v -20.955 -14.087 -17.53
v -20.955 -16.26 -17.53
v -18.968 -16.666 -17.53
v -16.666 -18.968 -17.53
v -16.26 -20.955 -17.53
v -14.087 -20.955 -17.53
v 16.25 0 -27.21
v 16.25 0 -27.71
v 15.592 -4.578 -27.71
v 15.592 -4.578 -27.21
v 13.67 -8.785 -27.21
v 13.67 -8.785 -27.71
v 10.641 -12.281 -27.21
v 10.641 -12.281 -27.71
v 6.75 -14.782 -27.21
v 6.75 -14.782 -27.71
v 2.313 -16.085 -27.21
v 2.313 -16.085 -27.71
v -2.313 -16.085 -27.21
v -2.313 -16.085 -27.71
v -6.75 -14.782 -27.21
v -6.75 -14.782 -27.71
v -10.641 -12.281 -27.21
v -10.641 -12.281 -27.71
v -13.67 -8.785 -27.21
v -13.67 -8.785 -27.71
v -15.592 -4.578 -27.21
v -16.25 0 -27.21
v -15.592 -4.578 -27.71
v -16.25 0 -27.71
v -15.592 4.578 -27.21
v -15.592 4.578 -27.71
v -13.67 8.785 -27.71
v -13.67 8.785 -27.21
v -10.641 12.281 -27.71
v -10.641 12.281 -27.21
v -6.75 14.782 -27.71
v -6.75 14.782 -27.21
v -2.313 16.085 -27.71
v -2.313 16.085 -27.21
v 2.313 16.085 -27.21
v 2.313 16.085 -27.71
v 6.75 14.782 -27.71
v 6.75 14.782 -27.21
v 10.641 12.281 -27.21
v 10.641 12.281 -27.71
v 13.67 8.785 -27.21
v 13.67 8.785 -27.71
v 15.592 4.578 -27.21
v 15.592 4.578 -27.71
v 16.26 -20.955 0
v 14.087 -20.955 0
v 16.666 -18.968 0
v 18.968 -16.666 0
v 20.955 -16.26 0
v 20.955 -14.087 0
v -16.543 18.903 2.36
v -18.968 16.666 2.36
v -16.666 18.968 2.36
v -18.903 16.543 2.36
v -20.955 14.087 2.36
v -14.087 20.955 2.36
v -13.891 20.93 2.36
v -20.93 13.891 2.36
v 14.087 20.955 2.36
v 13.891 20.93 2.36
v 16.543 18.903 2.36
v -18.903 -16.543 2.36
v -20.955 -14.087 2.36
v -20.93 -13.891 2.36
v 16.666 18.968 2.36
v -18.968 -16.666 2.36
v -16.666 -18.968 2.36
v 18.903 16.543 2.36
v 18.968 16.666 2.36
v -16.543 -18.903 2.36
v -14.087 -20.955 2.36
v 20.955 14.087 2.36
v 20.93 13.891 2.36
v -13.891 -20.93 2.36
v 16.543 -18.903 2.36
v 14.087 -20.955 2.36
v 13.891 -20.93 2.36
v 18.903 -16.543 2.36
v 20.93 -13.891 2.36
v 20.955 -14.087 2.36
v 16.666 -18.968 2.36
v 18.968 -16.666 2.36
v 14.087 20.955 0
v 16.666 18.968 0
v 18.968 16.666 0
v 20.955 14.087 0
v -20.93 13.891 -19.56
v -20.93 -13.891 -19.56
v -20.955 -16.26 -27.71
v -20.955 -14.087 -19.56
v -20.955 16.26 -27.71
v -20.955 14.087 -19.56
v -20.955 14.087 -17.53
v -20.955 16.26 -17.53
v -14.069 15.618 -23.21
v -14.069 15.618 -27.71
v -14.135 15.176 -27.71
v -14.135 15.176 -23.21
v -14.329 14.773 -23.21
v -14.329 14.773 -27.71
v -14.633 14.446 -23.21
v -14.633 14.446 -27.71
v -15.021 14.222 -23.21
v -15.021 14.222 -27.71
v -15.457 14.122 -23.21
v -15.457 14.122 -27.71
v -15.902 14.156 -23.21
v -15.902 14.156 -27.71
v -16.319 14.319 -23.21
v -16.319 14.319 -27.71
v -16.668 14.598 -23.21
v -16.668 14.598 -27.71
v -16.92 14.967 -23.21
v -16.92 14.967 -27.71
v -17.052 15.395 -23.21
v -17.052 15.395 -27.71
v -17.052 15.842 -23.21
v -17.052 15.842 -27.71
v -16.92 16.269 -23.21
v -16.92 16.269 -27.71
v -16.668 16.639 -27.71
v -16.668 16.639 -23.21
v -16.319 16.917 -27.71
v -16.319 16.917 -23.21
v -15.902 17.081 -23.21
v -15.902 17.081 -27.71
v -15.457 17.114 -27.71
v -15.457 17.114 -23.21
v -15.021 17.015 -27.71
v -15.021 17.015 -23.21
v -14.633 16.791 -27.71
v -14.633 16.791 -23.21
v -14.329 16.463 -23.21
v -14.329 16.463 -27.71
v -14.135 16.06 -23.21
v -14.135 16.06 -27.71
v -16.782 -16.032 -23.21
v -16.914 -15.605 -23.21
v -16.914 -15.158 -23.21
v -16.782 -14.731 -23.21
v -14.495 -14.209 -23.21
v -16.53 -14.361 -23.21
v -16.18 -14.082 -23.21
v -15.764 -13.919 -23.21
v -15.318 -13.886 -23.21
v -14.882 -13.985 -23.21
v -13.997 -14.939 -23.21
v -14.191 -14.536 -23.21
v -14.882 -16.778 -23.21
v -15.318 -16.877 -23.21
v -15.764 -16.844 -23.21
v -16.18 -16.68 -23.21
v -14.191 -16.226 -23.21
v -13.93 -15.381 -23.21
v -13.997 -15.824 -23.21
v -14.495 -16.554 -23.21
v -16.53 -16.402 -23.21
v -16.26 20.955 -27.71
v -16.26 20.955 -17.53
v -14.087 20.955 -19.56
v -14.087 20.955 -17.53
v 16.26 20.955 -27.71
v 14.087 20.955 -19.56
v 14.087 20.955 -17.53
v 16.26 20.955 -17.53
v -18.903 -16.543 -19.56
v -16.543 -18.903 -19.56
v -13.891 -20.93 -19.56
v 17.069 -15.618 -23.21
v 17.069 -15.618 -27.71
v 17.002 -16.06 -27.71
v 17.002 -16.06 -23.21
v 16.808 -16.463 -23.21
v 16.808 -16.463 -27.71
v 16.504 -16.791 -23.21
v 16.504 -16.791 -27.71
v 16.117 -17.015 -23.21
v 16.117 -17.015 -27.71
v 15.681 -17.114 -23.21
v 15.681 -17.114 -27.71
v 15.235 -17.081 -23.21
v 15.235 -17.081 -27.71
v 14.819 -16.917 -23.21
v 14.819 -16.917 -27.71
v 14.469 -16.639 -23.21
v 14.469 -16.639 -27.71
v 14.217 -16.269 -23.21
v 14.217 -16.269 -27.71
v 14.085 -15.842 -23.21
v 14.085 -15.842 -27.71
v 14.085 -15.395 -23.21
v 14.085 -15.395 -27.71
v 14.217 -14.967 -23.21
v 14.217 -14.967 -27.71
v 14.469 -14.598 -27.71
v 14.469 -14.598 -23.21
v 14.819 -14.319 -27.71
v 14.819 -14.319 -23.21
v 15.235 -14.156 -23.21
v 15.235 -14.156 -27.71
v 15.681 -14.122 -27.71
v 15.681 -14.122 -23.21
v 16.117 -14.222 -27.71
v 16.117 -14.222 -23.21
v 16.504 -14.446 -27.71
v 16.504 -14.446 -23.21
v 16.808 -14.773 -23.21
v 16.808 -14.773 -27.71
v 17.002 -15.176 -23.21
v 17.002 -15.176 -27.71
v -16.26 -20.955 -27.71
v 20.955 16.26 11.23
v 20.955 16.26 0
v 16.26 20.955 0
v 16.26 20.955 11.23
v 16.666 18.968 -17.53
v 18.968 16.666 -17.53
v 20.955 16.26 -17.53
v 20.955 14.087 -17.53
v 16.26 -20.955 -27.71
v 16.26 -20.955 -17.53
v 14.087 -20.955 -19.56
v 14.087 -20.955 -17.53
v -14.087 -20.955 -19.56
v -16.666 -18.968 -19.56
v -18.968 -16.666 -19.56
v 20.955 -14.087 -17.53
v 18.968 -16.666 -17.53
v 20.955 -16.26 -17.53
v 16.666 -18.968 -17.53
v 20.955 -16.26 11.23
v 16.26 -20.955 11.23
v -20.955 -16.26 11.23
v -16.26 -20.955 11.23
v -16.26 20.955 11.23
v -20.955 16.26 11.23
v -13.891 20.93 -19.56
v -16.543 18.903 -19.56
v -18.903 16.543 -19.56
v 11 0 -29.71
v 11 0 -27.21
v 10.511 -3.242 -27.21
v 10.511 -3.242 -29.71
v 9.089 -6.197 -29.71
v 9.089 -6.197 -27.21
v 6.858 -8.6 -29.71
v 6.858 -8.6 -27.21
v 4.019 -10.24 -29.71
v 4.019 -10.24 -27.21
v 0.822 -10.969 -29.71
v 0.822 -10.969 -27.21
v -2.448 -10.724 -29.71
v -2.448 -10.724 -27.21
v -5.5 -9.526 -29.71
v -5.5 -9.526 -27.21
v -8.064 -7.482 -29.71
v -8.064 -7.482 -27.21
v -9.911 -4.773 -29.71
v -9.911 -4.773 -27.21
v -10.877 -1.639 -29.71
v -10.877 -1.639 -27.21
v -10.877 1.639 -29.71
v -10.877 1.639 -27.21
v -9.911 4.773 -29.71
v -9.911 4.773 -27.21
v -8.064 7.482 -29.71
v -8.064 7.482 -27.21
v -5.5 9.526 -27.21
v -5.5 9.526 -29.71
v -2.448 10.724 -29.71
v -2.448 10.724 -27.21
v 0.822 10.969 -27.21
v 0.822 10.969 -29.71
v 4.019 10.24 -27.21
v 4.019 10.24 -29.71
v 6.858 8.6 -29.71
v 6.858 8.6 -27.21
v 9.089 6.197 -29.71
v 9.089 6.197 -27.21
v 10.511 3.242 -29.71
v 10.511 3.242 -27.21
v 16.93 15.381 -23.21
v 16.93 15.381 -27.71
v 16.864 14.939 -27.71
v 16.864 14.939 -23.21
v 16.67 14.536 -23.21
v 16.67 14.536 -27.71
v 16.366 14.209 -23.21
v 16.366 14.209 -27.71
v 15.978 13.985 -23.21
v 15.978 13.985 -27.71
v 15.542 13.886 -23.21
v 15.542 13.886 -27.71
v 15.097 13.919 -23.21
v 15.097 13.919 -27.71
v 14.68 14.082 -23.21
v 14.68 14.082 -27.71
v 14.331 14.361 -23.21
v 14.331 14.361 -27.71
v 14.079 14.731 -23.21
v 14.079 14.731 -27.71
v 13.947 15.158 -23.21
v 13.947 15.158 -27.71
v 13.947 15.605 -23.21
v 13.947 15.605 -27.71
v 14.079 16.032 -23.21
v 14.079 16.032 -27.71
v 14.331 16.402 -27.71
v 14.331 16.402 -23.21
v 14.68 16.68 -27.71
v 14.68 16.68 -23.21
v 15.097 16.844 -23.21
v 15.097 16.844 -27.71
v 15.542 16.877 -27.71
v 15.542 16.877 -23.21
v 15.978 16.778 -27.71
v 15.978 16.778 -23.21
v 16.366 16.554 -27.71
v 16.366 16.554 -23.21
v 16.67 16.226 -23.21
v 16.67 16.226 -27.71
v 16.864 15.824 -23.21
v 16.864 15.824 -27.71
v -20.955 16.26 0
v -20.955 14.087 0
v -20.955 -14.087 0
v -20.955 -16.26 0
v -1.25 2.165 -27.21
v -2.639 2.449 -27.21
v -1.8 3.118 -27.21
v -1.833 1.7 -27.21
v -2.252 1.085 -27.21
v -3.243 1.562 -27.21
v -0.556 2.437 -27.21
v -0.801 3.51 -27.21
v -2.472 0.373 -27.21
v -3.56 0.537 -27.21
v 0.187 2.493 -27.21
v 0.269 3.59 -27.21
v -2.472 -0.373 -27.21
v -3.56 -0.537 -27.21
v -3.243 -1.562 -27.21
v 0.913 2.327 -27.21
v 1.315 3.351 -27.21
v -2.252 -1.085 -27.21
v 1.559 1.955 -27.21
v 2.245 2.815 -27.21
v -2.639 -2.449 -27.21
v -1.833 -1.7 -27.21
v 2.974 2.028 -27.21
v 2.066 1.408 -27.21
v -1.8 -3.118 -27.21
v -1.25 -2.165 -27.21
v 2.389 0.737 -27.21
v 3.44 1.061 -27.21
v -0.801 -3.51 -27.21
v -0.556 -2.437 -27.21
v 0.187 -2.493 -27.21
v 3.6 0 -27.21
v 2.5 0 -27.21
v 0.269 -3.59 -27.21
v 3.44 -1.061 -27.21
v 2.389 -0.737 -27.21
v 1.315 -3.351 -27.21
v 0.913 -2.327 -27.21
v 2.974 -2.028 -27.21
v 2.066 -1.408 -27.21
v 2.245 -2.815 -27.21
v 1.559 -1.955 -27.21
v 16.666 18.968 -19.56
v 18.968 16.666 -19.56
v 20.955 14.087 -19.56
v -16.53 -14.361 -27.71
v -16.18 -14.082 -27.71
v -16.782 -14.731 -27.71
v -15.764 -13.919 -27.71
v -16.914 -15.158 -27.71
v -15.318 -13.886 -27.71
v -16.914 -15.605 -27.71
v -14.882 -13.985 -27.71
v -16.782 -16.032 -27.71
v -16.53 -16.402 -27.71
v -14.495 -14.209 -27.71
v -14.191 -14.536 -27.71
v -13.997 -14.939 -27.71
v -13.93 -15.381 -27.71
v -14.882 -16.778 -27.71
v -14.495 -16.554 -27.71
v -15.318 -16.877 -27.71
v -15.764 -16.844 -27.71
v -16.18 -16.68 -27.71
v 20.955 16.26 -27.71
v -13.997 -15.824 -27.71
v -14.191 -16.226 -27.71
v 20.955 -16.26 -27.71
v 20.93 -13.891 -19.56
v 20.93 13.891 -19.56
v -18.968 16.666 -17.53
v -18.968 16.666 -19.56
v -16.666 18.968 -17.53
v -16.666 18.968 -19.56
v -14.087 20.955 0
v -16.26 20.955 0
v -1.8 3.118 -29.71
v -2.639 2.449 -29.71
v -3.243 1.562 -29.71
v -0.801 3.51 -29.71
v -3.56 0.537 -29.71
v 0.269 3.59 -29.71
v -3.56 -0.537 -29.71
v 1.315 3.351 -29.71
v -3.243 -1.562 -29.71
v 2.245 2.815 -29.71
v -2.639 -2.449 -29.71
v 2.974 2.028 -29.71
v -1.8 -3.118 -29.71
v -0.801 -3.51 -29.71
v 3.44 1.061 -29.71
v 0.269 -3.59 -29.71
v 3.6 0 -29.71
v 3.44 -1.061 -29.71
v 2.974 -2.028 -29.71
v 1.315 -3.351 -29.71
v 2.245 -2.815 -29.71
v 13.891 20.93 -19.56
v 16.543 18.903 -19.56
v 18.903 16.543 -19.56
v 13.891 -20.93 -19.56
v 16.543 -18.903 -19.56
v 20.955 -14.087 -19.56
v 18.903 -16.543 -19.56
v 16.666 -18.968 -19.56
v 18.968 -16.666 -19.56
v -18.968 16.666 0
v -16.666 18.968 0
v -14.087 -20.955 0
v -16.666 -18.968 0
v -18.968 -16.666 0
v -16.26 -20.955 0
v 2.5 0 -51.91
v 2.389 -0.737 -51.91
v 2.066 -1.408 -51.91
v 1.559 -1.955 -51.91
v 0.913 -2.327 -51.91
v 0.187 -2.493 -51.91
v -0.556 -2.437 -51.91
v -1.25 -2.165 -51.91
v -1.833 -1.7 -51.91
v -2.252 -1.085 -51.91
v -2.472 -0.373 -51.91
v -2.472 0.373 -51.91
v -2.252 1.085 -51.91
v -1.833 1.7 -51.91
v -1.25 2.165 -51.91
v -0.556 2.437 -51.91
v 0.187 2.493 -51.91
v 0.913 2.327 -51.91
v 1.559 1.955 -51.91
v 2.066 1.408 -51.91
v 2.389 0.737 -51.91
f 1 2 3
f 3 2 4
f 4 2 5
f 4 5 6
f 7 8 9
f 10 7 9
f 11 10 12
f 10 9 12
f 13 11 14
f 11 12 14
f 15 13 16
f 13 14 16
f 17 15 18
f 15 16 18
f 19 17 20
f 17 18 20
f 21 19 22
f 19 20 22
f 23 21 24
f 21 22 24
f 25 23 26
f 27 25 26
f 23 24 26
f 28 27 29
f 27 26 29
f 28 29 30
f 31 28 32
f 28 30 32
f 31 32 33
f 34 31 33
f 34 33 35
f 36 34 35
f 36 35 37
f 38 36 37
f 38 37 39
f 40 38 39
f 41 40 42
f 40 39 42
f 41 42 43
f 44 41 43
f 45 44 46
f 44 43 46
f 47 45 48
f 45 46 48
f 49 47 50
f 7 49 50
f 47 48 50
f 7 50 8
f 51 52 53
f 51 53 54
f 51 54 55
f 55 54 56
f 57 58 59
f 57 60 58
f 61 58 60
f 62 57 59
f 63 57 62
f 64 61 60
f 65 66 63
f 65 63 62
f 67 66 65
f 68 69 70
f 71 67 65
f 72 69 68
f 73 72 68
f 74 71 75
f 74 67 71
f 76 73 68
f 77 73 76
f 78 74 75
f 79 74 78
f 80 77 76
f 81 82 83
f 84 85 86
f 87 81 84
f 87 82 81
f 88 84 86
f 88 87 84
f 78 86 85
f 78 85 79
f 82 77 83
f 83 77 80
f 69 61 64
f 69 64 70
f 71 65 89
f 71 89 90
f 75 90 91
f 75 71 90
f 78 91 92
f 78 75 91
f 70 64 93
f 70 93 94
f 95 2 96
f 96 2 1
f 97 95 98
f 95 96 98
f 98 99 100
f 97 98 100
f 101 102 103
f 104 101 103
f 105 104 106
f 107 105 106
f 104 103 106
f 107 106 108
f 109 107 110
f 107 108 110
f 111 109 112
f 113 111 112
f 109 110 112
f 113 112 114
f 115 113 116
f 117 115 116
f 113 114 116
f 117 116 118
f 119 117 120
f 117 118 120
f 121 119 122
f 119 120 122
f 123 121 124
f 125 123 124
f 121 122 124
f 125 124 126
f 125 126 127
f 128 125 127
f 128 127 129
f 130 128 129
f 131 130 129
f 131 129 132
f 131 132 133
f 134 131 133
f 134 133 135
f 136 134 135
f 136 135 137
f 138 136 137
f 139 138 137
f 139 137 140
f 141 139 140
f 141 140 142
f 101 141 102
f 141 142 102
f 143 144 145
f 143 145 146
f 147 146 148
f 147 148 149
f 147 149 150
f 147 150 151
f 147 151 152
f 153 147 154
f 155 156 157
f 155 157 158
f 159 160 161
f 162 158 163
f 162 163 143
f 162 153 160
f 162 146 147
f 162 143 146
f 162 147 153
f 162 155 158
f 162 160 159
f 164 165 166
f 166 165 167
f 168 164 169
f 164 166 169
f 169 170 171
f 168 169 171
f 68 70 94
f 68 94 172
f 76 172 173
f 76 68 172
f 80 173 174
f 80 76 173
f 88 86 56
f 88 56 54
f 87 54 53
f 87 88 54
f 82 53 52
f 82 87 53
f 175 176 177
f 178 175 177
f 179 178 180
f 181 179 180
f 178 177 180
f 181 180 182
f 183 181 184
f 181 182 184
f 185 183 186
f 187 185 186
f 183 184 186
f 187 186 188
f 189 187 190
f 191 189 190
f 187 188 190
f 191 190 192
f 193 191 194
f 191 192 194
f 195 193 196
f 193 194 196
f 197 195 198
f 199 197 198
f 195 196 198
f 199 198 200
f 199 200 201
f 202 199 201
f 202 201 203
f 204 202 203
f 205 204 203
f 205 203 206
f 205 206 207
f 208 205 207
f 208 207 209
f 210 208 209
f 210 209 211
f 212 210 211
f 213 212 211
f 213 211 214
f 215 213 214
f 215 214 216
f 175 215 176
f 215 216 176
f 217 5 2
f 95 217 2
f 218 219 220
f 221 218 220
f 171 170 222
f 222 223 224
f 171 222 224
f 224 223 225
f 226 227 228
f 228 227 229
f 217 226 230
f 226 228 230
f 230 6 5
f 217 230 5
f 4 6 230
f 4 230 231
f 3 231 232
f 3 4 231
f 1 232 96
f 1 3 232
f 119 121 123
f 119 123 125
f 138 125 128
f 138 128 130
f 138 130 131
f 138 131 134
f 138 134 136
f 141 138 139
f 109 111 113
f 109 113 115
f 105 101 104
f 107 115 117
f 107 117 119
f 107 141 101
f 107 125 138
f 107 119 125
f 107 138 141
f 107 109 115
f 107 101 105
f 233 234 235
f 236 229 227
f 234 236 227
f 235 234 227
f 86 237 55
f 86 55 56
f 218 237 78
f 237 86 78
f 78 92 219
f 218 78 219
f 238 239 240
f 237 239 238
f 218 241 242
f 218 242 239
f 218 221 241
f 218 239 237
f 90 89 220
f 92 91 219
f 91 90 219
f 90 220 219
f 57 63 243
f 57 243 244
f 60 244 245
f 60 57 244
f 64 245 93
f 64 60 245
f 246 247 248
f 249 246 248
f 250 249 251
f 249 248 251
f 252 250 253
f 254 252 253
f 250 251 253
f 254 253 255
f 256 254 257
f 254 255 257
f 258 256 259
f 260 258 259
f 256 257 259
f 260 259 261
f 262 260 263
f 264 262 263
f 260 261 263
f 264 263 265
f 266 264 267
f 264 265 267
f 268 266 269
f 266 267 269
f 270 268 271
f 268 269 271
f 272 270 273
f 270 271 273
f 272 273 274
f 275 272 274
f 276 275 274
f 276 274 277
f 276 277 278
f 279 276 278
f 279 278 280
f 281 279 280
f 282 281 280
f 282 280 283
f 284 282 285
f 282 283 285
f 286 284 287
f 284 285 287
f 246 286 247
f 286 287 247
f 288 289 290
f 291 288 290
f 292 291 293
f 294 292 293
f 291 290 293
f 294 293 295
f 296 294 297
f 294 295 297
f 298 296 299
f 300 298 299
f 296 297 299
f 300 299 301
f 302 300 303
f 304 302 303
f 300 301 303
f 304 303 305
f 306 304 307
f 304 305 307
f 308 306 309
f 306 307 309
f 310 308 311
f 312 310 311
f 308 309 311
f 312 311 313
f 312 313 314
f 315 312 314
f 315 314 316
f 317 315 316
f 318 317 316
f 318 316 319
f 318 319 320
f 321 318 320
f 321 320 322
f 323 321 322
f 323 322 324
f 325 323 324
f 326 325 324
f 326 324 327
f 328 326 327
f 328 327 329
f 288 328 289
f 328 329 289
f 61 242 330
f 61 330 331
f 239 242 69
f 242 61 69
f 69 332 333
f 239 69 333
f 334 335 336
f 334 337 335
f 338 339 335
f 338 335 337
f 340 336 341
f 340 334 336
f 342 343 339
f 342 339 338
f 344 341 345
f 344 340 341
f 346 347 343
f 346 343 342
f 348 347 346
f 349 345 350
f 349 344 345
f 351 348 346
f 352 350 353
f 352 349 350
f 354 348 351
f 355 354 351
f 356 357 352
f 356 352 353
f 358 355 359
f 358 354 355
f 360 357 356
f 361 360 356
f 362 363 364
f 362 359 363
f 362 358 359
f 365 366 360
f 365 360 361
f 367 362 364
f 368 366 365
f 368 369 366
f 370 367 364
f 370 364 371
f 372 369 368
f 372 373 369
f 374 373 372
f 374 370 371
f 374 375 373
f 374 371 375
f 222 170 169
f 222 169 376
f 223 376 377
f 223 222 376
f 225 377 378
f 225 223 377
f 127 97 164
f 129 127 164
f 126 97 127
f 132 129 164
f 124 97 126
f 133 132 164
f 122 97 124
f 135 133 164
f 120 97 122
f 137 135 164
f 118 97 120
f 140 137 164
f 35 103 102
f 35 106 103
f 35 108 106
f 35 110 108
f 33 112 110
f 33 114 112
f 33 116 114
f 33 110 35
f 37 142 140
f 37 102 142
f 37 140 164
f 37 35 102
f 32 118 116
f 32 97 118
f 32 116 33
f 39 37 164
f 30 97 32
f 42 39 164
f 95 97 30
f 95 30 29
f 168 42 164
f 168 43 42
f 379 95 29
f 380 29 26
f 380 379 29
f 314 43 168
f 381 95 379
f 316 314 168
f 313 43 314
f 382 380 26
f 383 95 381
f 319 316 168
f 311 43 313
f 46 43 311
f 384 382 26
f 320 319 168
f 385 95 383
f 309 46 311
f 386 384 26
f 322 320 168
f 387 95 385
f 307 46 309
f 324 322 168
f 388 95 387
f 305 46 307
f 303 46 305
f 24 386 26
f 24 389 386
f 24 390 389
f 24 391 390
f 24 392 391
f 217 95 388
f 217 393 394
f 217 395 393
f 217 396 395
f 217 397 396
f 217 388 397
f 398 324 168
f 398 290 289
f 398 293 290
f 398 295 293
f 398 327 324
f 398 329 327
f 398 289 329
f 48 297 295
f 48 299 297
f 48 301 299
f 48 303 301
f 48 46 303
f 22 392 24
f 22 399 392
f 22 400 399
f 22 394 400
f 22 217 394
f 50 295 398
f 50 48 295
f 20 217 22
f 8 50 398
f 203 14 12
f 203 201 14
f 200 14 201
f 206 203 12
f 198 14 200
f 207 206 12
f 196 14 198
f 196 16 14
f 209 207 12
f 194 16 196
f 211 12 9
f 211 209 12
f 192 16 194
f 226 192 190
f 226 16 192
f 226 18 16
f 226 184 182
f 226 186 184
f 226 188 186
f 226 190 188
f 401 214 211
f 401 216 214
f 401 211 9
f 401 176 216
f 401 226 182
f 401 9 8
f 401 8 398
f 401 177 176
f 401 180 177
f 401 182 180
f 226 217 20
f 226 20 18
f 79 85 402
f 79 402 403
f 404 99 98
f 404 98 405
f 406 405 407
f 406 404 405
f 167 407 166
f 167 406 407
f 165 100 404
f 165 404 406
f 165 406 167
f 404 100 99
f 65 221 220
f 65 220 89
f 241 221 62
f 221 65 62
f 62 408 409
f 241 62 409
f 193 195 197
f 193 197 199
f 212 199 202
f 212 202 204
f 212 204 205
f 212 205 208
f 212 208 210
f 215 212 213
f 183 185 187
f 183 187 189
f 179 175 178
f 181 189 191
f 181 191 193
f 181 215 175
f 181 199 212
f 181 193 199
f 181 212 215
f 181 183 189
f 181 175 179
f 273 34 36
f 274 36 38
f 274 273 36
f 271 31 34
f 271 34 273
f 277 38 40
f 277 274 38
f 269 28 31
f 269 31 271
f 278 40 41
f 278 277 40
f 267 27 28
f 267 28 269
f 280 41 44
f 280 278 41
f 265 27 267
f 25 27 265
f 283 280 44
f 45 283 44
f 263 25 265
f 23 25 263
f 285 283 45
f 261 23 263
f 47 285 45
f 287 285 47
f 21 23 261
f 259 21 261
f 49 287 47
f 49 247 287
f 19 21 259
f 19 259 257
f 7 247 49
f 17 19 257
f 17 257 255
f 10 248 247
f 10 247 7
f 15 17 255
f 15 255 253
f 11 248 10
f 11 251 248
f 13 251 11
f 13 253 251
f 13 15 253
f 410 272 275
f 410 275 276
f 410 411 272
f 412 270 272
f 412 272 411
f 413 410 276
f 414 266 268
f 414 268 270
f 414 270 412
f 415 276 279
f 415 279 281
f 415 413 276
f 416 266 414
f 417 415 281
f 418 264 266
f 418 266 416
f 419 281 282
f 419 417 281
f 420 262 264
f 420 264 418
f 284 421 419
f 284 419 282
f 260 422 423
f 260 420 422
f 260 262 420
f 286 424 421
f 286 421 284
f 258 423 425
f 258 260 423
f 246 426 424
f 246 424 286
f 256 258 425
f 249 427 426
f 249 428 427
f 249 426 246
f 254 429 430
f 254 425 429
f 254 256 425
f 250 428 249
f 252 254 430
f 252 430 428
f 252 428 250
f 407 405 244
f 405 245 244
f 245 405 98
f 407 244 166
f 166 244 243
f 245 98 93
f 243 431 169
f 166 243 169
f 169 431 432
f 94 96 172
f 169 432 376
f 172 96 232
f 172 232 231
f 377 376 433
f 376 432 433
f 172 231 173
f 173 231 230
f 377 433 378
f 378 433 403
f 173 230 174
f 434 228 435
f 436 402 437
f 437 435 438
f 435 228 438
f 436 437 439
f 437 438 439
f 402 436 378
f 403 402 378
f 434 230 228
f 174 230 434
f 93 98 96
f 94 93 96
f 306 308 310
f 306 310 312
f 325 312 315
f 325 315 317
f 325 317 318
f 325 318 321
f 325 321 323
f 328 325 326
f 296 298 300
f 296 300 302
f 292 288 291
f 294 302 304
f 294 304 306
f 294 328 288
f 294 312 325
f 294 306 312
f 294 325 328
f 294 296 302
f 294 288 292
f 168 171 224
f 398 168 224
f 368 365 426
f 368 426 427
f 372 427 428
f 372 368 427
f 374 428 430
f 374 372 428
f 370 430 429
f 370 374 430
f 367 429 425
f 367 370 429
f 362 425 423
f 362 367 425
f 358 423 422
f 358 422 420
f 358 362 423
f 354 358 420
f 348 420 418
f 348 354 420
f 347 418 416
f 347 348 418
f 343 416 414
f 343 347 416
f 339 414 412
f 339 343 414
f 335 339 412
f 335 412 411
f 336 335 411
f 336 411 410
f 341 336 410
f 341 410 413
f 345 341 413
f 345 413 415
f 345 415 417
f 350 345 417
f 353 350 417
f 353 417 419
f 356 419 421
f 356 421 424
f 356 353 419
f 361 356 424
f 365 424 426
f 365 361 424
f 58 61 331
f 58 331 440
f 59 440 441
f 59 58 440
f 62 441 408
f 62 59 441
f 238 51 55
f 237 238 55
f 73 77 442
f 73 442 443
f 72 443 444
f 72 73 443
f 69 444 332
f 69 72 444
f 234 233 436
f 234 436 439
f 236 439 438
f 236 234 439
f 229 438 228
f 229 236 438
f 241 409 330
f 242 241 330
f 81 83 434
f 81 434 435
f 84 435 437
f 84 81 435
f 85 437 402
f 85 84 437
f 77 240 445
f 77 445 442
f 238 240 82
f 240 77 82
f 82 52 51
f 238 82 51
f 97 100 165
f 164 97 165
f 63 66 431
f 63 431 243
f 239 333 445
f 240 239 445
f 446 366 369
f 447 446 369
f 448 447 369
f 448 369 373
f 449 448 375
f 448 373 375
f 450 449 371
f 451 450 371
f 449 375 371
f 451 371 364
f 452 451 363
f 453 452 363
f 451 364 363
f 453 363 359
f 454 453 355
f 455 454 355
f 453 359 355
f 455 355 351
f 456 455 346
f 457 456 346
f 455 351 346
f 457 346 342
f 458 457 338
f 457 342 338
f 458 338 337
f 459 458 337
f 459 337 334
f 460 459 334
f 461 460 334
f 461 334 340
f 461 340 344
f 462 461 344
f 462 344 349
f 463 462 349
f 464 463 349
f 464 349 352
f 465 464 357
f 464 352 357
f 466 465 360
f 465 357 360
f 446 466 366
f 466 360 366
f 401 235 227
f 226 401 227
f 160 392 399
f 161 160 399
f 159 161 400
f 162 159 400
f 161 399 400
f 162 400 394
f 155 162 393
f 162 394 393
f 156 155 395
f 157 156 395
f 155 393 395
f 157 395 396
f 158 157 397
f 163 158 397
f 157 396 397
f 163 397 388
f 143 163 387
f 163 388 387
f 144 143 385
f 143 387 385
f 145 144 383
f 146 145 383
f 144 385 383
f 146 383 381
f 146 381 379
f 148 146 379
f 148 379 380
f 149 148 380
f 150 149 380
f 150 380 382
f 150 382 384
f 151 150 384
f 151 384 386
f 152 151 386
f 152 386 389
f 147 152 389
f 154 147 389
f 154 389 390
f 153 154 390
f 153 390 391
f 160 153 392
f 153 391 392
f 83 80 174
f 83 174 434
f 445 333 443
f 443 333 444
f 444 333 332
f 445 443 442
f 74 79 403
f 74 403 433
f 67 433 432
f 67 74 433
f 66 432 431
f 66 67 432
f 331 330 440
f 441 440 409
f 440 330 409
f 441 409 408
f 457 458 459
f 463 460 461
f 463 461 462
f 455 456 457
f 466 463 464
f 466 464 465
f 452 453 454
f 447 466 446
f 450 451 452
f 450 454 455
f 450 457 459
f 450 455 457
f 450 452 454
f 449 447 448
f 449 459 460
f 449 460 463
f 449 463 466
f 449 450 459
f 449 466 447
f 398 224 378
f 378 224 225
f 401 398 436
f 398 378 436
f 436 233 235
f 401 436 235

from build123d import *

# Parameters (mm, degrees)
F1_DEPTH      = 11.23
F4_DEPTH      = 10.18
F6_DEPTH      = 2.36
F6_DEPTH_BACK = 19.56
F9_DEPTH      = 21.92
F10_R         = 16.25
F11_DEPTH     = 0.5
F12_R         = 11
F12_R_2       = 3.6
F13_DEPTH     = 2.5
F14_R         = 2.5
F15_DEPTH     = 24.7
F16_R         = 1.5
F17_DEPTH     = 4.5


with BuildPart() as f1:
    # F0 (on Top) → F1 (new body)
    with BuildSketch(Plane.XY):
        Polygon((-16.2600298938, 20.955), (-20.955, 16.2600298938), (-20.955, -16.2600298938), (-16.2600298938, -20.955), (16.2600298938, -20.955), (20.955, -16.2600298938), (20.955, 16.2600298938), (16.2600298938, 20.955), align=None)
    extrude(amount=F1_DEPTH)


with BuildPart() as f4:
    # F3 (on offset) → F4 (new body)
    with BuildSketch(Plane(origin=(0, 0, -17.53), x_dir=(1, 0, 0), z_dir=(0, 0, -1))):
        Polygon((-16.2600298938, 20.955), (-20.955, 16.2600298938), (-20.955, -16.2600298938), (-16.2600298938, -20.955), (16.2600298938, -20.955), (20.955, -16.2600298938), (20.955, 16.2600298938), (16.2600298938, 20.955), align=None)
    extrude(amount=F4_DEPTH)


with BuildPart() as f6_tool:
    # F5 (on face) → F6 (new body, two sides)
    with BuildSketch(Plane(origin=(0, 0, 0), x_dir=(1, 0, 0), z_dir=(0, 0, -1))) as f6_sk:
        with BuildLine():
            Line((20.955, -14.0872451175), (20.955, 14.0872451175))
            ThreePointArc((20.955, 14.0872451175), (17.854446225, 17.854446225), (14.0872451175, 20.955))
            Line((14.0872451175, 20.955), (-14.0872451175, 20.955))
            ThreePointArc((-14.0872451175, 20.955), (-17.854446225, 17.854446225), (-20.955, 14.0872451175))
            Line((-20.955, 14.0872451175), (-20.955, -14.0872451175))
            ThreePointArc((-20.955, -14.0872451175), (-17.854446225, -17.854446225), (-14.0872451175, -20.955))
            Line((-14.0872451175, -20.955), (14.0872451175, -20.955))
            ThreePointArc((14.0872451175, -20.955), (17.854446225, -17.854446225), (20.955, -14.0872451175))
        make_face()
    extrude(amount=-F6_DEPTH)
    extrude(f6_sk.sketch, amount=F6_DEPTH_BACK)


with BuildPart() as f1_1:
    add(f1.part)

    # F6: cut by f6_tool
    add(f6_tool.part, mode=Mode.SUBTRACT)



with BuildPart() as f4_1:
    add(f4.part)

    # F6: cut by f6_tool
    add(f6_tool.part, mode=Mode.SUBTRACT)


with BuildPart() as f1_2:
    add(f1_1.part)

    add(f4_1.part)  # F9 merges F4
    # F8 (on offset) → F9 (join)
    with BuildSketch(Plane.XY.offset(2.36)):
        with BuildLine():
            Line((13.8906263358, 20.93), (-13.8906263358, 20.93))
            ThreePointArc((-13.8906263358, 20.93), (-17.7625223434, 17.7625223434), (-20.93, 13.8906263358))
            Line((-20.93, 13.8906263358), (-20.93, -13.8906263358))
            ThreePointArc((-20.93, -13.8906263358), (-17.7625223434, -17.7625223434), (-13.8906263358, -20.93))
            Line((-13.8906263358, -20.93), (13.8906263358, -20.93))
            ThreePointArc((13.8906263358, -20.93), (17.7625223434, -17.7625223434), (20.93, -13.8906263358))
            Line((20.93, -13.8906263358), (20.93, 13.8906263358))
            ThreePointArc((20.93, 13.8906263358), (17.7625223434, 17.7625223434), (13.8906263358, 20.93))
        make_face()
    extrude(amount=-F9_DEPTH)

    # F10 (on face) → F11 (cut)
    with BuildSketch(Plane(origin=(0, 0, -27.71), x_dir=(1, 0, 0), z_dir=(0, 0, -1))):
        Circle(F10_R)
    extrude(amount=-F11_DEPTH, mode=Mode.SUBTRACT)

    # F12 (on face) → F13 (join)
    with BuildSketch(Plane(origin=(0, 0, -27.21), x_dir=(1, 0, 0), z_dir=(0, 0, -1))):
        Circle(F12_R)
        Circle(F12_R_2, mode=Mode.SUBTRACT)
    extrude(amount=F13_DEPTH)

    # F14 (on face) → F15 (join)
    with BuildSketch(Plane(origin=(0, 0, -27.21), x_dir=(1, 0, 0), z_dir=(0, 0, -1))):
        Circle(F14_R)
    extrude(amount=F15_DEPTH)

    # F16 (on face) → F17 (cut)
    with BuildSketch(Plane(origin=(0, 0, -27.71), x_dir=(1, 0, 0), z_dir=(0, 0, -1))):
        with Locations((15.430398907, -15.3814321037)):
            Circle(F16_R)
        with Locations((-15.568696448, -15.6182594076)):
            Circle(F16_R)
        with Locations((-15.430398907, 15.3814321037)):
            Circle(F16_R)
        with Locations((15.568696448, 15.6182594076)):
            Circle(F16_R)
    extrude(amount=-F17_DEPTH, mode=Mode.SUBTRACT)


solid = f1_2.part
